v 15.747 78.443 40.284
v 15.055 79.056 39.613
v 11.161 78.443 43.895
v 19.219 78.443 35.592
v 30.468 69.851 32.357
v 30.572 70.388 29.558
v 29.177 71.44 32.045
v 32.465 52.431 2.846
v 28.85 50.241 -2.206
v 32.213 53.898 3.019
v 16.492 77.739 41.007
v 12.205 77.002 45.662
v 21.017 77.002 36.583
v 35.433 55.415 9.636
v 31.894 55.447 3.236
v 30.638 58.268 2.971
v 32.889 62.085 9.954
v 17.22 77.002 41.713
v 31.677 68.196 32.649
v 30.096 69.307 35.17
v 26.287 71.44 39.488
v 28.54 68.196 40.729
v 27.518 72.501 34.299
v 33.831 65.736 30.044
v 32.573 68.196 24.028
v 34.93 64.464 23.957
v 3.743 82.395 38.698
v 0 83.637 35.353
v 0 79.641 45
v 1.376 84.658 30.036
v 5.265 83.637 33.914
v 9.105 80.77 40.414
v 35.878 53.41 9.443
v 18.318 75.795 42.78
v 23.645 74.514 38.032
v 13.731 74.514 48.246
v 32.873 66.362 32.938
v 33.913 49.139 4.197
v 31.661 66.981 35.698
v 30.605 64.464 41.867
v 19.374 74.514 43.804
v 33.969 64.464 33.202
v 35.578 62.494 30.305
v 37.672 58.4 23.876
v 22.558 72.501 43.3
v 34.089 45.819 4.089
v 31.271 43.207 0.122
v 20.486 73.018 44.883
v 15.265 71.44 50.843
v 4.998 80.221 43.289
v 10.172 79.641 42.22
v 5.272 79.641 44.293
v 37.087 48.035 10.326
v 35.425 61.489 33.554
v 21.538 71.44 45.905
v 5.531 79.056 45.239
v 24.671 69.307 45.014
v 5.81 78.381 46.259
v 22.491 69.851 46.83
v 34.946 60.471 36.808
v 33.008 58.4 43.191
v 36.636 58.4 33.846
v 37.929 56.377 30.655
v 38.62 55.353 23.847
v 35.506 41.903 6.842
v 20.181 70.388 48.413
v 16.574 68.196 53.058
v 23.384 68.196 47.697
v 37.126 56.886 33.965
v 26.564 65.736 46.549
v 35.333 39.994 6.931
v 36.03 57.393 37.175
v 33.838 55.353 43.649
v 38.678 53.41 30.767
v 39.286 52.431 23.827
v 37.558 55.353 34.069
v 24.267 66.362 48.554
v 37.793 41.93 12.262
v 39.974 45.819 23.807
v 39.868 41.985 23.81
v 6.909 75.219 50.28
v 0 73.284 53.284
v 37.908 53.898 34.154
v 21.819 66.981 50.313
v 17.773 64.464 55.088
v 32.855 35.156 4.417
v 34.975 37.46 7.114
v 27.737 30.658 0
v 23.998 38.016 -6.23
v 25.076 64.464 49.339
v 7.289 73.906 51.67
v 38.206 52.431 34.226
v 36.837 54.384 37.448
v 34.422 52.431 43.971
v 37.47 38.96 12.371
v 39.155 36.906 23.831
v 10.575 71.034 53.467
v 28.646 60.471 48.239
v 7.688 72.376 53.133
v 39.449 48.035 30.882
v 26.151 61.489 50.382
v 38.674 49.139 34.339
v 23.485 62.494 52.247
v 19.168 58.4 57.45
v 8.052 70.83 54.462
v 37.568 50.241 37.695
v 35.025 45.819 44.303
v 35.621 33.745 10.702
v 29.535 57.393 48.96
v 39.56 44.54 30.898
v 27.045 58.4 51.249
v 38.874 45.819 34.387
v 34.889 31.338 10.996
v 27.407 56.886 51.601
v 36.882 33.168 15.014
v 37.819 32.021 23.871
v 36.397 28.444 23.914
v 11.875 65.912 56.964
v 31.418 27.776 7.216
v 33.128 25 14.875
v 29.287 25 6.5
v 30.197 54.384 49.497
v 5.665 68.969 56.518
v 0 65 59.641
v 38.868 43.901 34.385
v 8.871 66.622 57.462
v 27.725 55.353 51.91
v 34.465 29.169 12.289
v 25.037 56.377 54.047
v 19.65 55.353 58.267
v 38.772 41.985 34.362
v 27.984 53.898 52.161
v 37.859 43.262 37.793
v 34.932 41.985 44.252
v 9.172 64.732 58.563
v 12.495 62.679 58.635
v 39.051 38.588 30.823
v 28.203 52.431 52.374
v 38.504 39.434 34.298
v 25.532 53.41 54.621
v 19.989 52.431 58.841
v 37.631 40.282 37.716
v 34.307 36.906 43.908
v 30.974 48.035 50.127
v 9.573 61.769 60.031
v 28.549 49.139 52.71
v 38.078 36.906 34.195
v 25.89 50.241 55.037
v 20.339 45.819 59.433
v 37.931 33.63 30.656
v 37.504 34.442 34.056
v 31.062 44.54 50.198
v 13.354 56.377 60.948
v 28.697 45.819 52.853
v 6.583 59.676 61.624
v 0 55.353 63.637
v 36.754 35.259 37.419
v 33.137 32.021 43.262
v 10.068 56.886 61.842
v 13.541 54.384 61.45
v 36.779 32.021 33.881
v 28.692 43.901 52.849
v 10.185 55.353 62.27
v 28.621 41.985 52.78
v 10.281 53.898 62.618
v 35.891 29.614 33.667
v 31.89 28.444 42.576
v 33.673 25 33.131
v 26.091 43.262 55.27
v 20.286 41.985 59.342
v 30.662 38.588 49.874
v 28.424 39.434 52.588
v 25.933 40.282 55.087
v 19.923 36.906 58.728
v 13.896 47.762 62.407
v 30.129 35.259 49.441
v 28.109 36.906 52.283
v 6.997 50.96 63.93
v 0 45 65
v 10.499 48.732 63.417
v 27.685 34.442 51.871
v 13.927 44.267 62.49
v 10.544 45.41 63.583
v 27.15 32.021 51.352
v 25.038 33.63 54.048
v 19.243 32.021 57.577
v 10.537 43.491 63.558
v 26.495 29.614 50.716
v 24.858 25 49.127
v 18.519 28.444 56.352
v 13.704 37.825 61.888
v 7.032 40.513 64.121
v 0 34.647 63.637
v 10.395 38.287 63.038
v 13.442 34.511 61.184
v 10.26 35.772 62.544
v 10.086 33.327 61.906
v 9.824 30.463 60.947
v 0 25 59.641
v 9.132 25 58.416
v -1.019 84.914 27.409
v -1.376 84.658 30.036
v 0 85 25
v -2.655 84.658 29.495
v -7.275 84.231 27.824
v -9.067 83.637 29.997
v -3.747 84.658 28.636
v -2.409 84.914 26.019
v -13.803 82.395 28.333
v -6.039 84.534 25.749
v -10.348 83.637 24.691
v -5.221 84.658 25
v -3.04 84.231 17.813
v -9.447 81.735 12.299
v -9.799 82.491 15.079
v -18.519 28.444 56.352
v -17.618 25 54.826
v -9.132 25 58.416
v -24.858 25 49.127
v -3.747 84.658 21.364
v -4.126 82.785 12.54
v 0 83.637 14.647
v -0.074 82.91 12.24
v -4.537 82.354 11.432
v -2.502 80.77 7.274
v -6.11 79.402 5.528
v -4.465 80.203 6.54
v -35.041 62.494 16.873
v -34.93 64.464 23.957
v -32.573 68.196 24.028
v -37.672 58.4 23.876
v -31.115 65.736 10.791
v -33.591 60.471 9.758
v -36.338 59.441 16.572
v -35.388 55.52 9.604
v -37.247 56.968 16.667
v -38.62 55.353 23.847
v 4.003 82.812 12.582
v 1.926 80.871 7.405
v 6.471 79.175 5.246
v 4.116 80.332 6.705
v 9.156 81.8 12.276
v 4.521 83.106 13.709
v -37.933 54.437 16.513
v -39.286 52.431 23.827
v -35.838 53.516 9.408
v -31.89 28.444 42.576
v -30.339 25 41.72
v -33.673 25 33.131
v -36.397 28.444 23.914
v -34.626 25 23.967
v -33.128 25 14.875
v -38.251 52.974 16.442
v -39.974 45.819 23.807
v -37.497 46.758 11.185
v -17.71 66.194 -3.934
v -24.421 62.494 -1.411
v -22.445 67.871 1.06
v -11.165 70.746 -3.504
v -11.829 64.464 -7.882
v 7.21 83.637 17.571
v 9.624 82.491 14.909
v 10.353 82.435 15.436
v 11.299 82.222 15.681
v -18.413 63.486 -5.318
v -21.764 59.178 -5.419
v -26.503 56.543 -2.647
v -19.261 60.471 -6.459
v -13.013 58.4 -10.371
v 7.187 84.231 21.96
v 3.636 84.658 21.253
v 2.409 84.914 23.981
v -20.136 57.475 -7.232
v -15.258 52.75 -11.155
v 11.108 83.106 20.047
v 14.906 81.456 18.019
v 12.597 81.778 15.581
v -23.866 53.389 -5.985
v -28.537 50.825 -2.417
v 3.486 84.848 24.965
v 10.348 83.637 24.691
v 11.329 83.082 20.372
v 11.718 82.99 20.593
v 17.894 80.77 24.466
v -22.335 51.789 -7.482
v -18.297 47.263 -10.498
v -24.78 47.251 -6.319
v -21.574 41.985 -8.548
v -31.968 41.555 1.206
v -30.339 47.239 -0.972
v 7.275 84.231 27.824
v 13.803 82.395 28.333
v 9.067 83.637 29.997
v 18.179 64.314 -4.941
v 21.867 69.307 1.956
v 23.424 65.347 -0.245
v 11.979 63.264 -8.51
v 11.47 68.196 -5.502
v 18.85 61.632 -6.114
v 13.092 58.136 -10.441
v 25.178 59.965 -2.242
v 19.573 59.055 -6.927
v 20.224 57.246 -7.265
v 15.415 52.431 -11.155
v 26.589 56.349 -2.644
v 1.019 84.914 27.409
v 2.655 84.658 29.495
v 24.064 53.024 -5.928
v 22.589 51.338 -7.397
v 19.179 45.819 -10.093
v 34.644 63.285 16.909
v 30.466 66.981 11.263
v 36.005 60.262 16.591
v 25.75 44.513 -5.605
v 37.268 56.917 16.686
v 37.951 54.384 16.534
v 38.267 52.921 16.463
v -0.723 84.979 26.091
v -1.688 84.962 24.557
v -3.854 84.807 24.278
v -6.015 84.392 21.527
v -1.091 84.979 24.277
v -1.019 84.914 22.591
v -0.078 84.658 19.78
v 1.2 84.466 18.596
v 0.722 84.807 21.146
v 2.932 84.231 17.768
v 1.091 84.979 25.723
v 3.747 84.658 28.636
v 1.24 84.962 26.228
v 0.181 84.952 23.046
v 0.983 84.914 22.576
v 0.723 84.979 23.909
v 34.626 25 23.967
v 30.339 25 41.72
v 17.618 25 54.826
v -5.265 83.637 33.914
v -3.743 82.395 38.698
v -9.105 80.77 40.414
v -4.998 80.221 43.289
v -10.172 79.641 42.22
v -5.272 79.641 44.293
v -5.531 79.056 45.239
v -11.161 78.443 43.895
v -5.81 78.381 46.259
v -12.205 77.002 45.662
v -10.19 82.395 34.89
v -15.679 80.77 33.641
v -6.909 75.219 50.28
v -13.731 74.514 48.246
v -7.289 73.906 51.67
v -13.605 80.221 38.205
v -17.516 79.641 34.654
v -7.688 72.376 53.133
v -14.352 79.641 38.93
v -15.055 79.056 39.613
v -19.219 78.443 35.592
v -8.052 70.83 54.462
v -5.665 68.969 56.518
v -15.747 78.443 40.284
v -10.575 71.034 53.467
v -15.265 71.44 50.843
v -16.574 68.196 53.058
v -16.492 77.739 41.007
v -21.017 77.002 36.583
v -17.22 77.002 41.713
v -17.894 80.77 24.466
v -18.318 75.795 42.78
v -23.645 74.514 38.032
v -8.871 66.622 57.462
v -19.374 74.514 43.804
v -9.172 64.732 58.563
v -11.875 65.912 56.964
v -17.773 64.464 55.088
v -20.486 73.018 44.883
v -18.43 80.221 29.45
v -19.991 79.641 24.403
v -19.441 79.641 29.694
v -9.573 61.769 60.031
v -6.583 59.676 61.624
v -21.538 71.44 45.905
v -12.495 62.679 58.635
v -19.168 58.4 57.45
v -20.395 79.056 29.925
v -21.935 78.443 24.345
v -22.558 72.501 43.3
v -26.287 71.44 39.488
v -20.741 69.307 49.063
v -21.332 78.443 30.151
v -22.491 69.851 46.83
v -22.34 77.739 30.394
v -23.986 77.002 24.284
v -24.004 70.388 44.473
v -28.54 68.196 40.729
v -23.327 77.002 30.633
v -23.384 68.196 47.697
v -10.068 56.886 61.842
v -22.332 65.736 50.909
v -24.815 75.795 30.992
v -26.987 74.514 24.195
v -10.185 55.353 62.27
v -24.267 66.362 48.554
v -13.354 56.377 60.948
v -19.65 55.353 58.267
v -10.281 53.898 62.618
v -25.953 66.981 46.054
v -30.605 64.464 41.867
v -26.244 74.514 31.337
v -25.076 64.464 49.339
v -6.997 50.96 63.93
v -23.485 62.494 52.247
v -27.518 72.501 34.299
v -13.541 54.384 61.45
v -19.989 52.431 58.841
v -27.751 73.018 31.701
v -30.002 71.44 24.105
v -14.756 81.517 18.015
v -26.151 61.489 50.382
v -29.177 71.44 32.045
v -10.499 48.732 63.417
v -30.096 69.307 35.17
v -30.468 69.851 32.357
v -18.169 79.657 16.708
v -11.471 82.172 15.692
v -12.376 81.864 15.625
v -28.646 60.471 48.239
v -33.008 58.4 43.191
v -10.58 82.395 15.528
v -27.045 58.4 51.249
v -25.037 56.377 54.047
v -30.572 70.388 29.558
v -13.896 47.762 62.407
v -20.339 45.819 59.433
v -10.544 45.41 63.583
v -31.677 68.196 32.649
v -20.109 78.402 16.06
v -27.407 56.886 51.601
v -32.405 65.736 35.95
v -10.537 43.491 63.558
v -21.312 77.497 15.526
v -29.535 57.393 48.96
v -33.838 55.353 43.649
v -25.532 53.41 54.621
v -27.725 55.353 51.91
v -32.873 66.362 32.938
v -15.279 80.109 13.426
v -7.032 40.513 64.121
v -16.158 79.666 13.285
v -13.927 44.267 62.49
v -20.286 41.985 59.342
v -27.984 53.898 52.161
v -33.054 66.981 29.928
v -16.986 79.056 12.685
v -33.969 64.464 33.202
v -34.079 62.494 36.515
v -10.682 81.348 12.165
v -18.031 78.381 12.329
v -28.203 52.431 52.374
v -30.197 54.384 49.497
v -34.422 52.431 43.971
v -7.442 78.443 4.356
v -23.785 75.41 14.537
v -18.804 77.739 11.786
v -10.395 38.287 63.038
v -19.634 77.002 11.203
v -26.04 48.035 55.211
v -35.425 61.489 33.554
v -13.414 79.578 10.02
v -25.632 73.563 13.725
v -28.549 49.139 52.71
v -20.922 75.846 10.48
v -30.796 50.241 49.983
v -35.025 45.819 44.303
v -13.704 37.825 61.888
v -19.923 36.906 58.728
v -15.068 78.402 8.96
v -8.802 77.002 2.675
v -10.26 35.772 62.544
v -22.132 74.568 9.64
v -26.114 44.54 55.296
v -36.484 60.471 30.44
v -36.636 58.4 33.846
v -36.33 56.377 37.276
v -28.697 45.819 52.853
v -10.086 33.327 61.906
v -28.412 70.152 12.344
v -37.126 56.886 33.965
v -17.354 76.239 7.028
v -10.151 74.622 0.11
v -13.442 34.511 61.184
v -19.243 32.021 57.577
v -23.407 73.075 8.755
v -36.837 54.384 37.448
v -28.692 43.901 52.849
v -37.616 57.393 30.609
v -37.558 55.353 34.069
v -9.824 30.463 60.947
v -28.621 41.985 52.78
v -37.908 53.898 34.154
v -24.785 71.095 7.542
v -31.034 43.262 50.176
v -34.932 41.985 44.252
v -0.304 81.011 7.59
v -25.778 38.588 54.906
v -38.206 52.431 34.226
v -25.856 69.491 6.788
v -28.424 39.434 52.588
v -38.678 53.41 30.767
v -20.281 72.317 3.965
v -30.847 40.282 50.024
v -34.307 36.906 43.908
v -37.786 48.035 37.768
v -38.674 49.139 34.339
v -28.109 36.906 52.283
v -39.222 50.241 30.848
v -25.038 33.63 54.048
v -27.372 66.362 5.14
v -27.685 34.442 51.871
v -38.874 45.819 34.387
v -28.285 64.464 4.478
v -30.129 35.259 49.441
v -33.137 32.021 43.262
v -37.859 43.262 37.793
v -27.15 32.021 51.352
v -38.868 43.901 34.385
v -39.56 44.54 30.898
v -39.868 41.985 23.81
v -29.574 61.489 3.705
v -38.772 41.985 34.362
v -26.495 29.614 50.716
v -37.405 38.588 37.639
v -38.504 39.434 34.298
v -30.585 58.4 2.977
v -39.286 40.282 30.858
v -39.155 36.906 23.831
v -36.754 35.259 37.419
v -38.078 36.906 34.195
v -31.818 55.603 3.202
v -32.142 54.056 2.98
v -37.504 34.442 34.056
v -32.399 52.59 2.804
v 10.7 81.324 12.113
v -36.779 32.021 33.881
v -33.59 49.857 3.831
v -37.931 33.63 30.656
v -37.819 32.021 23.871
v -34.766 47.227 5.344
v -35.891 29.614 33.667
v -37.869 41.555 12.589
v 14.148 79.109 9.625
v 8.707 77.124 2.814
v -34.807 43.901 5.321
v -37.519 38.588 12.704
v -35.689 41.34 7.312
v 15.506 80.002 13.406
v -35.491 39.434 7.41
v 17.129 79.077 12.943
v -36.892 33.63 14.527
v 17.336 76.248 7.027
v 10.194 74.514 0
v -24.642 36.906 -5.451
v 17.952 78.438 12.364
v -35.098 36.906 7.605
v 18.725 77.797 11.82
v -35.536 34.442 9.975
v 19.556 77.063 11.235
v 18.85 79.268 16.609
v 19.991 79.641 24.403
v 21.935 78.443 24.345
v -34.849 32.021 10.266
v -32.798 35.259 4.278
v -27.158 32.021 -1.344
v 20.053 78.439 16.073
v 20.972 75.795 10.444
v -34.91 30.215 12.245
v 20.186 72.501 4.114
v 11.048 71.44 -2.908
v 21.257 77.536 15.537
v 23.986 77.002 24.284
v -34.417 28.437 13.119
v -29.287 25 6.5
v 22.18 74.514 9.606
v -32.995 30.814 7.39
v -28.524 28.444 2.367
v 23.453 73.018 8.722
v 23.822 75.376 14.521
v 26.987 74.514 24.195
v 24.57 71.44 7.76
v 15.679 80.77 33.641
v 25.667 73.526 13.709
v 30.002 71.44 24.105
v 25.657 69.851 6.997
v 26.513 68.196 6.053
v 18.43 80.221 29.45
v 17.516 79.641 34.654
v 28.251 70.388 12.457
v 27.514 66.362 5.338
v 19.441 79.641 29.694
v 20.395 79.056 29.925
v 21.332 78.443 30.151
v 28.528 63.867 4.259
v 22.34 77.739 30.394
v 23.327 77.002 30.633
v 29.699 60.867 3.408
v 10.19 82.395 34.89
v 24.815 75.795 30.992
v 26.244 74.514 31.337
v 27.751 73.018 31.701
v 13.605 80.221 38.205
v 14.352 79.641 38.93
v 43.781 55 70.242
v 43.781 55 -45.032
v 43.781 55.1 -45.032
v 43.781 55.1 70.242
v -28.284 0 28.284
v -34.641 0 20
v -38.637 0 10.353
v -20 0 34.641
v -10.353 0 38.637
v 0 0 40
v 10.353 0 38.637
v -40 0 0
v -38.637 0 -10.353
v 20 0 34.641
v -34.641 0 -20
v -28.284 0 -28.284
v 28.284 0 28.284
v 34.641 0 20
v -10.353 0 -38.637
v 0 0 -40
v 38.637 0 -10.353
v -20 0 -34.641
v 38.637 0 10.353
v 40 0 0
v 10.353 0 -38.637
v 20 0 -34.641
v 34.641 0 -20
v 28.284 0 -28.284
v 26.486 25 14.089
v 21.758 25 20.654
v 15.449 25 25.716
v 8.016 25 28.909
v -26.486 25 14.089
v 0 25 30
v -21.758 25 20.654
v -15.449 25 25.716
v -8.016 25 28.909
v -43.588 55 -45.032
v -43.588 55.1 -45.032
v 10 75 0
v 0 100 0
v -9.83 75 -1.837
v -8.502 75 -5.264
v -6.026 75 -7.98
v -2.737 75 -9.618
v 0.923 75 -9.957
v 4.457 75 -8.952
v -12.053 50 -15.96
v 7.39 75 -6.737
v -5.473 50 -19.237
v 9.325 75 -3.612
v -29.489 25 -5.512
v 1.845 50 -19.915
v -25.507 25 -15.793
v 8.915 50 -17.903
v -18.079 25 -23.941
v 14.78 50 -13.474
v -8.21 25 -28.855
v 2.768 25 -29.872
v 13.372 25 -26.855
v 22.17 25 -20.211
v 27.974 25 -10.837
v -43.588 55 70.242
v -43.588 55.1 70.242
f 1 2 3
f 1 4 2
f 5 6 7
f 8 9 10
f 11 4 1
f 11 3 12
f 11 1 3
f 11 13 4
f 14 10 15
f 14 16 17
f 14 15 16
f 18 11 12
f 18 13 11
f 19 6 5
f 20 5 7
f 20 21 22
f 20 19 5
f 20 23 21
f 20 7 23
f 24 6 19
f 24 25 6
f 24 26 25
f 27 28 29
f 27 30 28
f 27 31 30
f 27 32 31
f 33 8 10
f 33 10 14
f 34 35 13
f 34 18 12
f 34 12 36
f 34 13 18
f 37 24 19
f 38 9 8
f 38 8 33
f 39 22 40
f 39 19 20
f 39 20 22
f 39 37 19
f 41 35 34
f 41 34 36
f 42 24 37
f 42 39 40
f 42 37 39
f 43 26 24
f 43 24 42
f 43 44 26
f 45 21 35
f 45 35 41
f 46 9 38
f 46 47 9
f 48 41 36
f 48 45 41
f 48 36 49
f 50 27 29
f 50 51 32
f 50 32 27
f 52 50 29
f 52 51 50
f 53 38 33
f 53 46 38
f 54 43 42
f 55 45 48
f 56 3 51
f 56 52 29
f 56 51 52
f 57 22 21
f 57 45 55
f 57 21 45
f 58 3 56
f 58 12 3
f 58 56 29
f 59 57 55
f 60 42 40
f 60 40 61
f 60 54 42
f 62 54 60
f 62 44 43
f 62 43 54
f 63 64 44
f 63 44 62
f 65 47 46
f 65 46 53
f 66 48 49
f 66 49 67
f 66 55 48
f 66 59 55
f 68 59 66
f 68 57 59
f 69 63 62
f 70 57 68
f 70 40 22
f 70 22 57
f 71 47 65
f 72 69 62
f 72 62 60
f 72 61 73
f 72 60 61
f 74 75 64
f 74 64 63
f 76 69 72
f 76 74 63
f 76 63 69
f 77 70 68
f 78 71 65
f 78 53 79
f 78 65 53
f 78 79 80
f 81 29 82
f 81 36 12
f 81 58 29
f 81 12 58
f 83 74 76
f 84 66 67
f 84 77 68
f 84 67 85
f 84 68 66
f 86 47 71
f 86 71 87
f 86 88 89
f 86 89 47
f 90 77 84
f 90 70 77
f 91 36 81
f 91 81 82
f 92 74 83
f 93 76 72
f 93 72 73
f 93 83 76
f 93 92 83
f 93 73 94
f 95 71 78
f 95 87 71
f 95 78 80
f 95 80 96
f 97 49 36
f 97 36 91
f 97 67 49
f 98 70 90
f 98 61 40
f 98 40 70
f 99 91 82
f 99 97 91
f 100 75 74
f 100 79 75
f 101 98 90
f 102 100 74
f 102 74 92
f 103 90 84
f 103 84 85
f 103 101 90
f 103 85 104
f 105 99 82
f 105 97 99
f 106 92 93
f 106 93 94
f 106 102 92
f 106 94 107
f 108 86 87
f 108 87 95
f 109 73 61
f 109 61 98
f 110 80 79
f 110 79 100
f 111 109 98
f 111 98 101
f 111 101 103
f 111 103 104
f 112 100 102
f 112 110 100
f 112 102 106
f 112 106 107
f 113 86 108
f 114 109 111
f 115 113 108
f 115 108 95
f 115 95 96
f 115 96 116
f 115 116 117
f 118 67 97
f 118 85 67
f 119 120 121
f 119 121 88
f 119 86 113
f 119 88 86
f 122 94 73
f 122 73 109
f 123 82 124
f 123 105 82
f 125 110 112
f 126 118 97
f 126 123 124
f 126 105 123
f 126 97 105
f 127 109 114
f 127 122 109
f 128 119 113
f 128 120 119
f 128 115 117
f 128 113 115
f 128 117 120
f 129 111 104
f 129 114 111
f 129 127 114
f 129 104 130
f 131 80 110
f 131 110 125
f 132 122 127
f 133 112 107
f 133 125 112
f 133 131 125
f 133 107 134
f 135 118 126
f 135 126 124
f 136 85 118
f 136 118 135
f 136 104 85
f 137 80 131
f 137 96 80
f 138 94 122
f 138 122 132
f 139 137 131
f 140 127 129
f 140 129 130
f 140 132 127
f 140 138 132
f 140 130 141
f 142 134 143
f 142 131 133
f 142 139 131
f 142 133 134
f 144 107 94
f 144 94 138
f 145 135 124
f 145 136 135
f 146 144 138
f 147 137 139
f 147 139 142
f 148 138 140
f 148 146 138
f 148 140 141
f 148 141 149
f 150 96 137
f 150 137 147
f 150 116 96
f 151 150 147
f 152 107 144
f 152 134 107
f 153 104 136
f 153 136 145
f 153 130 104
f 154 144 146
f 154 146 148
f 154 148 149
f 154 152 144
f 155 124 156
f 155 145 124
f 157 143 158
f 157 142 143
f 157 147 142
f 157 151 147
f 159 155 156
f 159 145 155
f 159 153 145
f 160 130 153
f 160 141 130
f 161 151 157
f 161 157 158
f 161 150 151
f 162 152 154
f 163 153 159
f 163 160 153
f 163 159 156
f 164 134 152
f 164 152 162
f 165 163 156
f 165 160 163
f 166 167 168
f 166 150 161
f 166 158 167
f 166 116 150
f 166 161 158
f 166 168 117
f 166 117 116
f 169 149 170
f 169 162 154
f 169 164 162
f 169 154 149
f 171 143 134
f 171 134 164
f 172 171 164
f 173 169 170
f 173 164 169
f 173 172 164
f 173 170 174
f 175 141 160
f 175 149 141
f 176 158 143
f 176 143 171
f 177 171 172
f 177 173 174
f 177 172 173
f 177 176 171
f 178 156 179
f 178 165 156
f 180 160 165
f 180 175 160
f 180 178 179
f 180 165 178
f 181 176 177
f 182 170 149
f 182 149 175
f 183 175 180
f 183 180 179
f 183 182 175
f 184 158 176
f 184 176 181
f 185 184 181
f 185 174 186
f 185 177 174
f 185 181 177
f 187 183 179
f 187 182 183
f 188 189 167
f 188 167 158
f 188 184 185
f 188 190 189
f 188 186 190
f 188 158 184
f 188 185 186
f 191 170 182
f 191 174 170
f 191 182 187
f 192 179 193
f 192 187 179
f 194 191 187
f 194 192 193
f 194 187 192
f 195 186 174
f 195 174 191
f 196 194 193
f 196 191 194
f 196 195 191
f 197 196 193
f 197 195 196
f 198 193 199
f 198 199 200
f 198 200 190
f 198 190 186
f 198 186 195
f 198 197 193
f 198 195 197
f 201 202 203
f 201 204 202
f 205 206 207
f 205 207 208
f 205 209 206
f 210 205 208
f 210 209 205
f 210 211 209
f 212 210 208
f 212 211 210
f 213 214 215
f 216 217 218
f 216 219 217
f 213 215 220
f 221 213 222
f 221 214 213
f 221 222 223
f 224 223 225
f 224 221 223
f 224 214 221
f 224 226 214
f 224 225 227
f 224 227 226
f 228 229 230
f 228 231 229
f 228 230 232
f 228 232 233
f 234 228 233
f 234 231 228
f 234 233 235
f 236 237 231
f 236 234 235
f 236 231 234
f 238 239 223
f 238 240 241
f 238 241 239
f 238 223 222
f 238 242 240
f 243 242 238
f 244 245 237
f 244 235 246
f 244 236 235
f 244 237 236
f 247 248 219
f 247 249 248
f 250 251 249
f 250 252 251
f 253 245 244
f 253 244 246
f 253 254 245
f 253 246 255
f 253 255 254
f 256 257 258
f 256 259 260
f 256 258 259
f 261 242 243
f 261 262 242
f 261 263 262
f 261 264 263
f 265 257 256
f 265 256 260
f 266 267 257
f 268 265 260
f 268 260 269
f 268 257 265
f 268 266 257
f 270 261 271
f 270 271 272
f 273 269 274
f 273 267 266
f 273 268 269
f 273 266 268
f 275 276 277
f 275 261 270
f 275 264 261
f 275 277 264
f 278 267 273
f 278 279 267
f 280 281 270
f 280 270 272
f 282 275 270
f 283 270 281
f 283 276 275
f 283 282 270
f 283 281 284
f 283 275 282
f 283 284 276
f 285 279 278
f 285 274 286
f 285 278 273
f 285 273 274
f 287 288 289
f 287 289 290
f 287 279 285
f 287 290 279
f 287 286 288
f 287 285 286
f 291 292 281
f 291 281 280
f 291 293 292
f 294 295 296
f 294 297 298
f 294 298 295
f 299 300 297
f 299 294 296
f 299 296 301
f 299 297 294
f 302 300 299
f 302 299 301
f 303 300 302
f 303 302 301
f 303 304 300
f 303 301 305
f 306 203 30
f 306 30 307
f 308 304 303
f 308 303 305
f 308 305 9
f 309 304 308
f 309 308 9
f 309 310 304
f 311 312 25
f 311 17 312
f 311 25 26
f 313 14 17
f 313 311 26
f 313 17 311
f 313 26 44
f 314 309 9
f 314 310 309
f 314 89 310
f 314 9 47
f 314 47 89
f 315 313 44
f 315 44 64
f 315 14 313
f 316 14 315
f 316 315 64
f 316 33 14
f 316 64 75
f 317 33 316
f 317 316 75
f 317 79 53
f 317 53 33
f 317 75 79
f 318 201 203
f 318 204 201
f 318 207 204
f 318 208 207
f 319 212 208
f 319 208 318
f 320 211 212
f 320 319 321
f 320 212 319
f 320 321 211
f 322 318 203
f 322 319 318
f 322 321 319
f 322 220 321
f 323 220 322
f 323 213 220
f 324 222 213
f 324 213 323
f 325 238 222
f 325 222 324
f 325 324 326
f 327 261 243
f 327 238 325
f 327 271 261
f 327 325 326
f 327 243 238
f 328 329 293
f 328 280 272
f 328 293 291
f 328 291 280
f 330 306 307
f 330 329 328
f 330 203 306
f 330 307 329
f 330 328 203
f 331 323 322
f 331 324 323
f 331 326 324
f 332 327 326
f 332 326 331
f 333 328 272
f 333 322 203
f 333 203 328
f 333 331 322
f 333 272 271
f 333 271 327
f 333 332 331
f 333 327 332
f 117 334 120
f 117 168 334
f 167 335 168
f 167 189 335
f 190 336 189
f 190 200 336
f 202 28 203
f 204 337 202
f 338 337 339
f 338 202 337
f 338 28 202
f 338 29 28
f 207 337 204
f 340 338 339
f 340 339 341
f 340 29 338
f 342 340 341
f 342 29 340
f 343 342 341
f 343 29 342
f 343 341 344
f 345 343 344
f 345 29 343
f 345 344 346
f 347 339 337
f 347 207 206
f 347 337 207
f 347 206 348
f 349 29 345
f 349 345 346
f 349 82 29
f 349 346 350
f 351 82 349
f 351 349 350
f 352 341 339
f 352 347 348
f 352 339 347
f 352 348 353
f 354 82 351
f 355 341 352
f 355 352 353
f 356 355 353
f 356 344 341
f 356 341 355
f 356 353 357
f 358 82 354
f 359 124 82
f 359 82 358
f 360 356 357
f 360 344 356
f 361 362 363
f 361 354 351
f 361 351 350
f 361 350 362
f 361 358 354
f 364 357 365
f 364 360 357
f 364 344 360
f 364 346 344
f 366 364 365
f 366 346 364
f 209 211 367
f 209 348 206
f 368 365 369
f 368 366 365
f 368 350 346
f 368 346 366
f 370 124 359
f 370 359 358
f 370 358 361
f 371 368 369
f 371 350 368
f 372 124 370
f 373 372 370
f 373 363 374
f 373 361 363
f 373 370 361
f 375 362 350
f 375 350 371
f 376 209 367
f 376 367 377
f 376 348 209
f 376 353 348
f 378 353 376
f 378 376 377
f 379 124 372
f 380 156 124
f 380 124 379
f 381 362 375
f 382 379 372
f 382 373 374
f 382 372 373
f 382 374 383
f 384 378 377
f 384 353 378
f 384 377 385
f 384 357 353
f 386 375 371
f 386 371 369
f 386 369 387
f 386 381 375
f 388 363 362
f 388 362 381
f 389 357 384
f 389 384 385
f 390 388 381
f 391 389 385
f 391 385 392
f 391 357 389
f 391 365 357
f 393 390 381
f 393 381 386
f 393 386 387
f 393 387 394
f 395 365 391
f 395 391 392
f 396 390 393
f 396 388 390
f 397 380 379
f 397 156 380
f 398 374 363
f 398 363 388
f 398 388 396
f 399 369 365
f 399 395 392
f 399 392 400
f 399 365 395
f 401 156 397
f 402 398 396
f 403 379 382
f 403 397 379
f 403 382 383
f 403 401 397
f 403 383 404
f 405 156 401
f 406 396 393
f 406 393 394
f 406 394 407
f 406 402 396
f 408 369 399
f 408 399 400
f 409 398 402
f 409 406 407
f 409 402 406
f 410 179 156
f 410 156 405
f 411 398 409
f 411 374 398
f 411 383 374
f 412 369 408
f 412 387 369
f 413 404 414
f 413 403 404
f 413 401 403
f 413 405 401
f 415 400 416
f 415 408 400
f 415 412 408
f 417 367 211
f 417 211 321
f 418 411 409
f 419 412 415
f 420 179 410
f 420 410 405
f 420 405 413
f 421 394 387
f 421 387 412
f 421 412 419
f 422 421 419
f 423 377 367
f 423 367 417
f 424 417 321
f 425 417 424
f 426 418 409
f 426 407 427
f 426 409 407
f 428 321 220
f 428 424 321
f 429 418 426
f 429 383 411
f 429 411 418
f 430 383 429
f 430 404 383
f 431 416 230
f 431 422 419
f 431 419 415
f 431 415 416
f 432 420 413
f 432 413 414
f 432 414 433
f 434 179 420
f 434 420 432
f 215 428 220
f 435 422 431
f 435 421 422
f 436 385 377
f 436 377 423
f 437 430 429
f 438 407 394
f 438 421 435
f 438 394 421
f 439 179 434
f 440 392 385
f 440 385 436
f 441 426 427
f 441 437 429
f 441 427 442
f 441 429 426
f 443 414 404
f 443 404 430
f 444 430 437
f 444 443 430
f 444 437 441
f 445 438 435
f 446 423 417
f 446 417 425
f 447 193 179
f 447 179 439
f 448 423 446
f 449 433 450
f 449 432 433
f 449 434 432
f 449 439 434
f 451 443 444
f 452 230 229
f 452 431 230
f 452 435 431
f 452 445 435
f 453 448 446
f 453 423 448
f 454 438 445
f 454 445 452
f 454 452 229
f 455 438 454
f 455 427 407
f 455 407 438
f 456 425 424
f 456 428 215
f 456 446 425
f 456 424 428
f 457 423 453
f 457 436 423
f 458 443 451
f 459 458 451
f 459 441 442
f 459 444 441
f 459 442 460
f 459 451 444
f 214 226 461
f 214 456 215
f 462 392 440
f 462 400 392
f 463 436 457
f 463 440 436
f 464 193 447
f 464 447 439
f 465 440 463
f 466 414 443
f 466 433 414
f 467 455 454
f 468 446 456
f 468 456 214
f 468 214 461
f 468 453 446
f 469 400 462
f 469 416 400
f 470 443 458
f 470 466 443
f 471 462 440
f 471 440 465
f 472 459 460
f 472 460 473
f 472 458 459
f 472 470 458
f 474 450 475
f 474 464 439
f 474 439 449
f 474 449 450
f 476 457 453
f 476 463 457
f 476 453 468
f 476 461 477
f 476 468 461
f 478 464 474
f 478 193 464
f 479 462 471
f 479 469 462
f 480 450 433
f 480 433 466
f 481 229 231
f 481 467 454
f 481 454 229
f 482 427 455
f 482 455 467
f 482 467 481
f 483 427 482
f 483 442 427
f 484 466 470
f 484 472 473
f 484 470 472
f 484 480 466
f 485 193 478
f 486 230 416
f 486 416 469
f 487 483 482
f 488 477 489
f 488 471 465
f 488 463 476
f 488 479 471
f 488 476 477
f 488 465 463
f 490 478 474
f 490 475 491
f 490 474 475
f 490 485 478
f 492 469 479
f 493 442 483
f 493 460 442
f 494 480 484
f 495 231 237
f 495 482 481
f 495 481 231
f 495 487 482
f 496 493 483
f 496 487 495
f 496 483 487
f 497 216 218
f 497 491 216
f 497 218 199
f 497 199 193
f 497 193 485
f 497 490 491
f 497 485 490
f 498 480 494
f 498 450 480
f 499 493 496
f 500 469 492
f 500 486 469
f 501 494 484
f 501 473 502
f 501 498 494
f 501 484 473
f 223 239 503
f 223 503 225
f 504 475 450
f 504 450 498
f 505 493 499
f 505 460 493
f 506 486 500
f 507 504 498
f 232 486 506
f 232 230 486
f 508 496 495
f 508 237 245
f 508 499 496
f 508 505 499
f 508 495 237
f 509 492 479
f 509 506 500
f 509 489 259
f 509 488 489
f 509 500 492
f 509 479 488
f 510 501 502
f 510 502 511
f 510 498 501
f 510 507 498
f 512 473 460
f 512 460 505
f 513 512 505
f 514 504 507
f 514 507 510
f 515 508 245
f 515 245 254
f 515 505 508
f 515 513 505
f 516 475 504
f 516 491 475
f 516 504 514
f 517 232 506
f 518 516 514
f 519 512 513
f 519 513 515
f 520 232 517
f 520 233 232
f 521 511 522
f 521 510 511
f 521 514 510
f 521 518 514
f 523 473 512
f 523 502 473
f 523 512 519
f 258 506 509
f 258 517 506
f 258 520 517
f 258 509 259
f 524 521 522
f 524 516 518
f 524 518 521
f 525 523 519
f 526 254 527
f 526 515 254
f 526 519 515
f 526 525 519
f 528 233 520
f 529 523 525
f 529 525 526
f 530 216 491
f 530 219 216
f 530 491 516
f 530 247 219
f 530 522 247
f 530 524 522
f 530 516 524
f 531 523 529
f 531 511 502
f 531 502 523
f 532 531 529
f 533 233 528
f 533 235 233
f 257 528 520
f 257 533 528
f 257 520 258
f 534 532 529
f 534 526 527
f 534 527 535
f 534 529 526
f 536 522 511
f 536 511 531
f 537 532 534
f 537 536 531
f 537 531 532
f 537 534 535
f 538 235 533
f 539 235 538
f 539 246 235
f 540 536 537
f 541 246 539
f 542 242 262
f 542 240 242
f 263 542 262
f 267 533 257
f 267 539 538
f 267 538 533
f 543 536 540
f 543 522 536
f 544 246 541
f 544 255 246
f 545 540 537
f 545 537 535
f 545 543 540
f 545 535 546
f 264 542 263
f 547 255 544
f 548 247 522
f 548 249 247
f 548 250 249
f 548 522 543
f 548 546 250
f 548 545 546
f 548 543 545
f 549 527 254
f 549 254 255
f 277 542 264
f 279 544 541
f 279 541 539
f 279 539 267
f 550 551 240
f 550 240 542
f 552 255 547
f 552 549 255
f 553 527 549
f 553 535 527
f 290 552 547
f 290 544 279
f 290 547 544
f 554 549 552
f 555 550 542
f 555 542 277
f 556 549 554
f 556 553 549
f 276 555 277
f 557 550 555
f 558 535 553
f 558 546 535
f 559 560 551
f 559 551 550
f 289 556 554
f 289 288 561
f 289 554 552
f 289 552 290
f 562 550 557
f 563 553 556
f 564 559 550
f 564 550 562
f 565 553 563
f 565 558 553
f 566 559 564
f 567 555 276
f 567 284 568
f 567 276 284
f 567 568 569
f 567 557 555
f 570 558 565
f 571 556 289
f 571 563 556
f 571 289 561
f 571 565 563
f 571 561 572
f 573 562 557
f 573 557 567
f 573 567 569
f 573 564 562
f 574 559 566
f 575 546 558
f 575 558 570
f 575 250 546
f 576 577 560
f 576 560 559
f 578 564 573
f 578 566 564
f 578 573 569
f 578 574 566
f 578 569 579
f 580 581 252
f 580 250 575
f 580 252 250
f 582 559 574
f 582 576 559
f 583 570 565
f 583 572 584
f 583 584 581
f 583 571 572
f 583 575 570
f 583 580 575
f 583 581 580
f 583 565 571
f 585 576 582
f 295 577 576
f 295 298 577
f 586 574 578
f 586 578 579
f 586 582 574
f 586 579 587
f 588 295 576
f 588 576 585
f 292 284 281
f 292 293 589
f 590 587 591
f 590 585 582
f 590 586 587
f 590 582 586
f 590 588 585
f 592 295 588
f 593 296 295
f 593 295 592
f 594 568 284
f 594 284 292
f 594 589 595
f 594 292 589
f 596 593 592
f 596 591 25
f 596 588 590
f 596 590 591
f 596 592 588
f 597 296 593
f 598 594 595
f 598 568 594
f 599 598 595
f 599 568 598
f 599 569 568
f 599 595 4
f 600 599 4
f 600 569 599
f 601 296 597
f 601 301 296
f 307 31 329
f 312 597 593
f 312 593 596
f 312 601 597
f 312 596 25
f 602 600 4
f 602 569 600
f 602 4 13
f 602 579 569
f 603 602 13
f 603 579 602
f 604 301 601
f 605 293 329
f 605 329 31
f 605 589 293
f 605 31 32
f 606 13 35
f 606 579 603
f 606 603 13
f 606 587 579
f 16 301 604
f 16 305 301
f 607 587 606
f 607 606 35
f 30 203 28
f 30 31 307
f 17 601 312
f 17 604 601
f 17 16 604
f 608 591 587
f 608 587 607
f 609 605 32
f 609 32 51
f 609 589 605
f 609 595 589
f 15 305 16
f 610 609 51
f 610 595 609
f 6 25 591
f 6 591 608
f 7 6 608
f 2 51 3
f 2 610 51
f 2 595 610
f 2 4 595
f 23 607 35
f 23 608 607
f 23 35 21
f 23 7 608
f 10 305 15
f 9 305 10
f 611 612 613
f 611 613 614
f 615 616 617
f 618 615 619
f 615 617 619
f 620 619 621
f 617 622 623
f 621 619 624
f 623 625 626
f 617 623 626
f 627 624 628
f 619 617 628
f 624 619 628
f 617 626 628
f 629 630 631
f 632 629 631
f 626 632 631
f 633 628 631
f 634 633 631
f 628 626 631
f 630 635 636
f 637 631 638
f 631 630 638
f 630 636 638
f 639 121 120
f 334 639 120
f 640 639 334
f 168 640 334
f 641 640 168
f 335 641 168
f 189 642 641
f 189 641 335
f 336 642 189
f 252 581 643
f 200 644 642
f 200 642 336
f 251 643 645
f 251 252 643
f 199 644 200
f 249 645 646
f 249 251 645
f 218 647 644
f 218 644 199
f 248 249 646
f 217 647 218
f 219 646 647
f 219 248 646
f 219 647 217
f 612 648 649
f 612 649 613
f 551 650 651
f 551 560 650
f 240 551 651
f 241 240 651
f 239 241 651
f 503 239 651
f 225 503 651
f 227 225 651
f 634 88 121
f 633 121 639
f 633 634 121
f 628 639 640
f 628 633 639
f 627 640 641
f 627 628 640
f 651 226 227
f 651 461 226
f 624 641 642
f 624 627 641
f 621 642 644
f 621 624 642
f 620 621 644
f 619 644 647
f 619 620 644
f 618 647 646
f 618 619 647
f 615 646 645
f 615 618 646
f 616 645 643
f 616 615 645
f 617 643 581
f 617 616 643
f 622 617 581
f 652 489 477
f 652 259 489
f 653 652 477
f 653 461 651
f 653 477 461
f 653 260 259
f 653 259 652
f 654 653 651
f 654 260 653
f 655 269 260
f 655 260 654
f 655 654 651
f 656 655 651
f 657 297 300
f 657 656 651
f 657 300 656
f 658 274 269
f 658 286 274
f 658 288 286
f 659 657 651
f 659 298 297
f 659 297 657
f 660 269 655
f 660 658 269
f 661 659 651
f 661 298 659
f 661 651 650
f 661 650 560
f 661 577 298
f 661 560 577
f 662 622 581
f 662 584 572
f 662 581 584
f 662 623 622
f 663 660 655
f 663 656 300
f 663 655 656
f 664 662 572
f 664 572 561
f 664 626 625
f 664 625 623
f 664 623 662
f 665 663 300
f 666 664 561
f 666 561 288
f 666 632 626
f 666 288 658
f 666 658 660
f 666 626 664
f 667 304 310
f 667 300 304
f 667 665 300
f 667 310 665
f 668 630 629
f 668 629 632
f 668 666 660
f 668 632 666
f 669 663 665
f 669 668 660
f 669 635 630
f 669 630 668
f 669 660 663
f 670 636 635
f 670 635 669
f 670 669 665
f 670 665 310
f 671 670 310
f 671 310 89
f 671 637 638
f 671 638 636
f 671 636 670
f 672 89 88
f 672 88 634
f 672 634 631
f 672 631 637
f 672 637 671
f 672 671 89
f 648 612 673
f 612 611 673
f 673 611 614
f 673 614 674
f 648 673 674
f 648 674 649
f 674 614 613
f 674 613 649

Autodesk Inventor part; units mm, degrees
ref_plane "YZ Plane" through (0, 0, 0) normal (1, 0, 0) x (0, 1, 0)
ref_plane "XY Plane" through (0, 0, 0) normal (0, 0, 1) x (1, 0, 0)
sketch "Эскиз1" plane through (0, 0, 0) normal (0, 0, 1) x (1, 0, 0)
  line L0 (0, 0) -> (40, 0)
  line L1 (0, 0) -> (0, 100)
  line L2 (0, 100) -> (40, 0)
  dimension "d0" = 40
  dimension "d1" = 100
revolve "Вращение1" add sketch "Эскиз1" angle 360 about axis through (0, 0, 0) along (0, 1, 0)
sketch "Эскиз3" plane through (0, 0, 0) normal (1, 0, 0) x (0, 1, 0)
  line L0 (0, -40) -> (0, 40) projected
  arc A0 (85, 25) -> (25, 59.641) centre (45, 25) ccw
  line L1 (25, 59.641) -> (25, 25)
  line L2 (85, 25) -> (25, 25)
  point P0 (0, 0)
  dimension "d10" = 80
revolve "Вращение2" add sketch "Эскиз3" angle 360 about axis through (0, 85, 25) along (0, -1, 0)
ref_plane "РабПлоскость1" through (0, 55, 0) normal (0, 1, 0) x (-1, 0, 0)
sketch "Эскиз4" plane through (0, 55, 0) normal (0, 1, 0) x (-1, 0, 0)
  line L0 (43.5884, -45.0317) -> (-43.7808, -45.0317)
  line L1 (-43.7808, -45.0317) -> (-43.7808, 70.2418)
  line L2 (-43.7808, 70.2418) -> (43.5884, 70.2418)
  line L3 (43.5884, 70.2418) -> (43.5884, -45.0317)
  point P0 (0, 0)
extrude "Выдавливание1" add sketch "Эскиз4" along normal blind 0.1 separate body
split_face "Разделение1"
split_face "Разделение2"
